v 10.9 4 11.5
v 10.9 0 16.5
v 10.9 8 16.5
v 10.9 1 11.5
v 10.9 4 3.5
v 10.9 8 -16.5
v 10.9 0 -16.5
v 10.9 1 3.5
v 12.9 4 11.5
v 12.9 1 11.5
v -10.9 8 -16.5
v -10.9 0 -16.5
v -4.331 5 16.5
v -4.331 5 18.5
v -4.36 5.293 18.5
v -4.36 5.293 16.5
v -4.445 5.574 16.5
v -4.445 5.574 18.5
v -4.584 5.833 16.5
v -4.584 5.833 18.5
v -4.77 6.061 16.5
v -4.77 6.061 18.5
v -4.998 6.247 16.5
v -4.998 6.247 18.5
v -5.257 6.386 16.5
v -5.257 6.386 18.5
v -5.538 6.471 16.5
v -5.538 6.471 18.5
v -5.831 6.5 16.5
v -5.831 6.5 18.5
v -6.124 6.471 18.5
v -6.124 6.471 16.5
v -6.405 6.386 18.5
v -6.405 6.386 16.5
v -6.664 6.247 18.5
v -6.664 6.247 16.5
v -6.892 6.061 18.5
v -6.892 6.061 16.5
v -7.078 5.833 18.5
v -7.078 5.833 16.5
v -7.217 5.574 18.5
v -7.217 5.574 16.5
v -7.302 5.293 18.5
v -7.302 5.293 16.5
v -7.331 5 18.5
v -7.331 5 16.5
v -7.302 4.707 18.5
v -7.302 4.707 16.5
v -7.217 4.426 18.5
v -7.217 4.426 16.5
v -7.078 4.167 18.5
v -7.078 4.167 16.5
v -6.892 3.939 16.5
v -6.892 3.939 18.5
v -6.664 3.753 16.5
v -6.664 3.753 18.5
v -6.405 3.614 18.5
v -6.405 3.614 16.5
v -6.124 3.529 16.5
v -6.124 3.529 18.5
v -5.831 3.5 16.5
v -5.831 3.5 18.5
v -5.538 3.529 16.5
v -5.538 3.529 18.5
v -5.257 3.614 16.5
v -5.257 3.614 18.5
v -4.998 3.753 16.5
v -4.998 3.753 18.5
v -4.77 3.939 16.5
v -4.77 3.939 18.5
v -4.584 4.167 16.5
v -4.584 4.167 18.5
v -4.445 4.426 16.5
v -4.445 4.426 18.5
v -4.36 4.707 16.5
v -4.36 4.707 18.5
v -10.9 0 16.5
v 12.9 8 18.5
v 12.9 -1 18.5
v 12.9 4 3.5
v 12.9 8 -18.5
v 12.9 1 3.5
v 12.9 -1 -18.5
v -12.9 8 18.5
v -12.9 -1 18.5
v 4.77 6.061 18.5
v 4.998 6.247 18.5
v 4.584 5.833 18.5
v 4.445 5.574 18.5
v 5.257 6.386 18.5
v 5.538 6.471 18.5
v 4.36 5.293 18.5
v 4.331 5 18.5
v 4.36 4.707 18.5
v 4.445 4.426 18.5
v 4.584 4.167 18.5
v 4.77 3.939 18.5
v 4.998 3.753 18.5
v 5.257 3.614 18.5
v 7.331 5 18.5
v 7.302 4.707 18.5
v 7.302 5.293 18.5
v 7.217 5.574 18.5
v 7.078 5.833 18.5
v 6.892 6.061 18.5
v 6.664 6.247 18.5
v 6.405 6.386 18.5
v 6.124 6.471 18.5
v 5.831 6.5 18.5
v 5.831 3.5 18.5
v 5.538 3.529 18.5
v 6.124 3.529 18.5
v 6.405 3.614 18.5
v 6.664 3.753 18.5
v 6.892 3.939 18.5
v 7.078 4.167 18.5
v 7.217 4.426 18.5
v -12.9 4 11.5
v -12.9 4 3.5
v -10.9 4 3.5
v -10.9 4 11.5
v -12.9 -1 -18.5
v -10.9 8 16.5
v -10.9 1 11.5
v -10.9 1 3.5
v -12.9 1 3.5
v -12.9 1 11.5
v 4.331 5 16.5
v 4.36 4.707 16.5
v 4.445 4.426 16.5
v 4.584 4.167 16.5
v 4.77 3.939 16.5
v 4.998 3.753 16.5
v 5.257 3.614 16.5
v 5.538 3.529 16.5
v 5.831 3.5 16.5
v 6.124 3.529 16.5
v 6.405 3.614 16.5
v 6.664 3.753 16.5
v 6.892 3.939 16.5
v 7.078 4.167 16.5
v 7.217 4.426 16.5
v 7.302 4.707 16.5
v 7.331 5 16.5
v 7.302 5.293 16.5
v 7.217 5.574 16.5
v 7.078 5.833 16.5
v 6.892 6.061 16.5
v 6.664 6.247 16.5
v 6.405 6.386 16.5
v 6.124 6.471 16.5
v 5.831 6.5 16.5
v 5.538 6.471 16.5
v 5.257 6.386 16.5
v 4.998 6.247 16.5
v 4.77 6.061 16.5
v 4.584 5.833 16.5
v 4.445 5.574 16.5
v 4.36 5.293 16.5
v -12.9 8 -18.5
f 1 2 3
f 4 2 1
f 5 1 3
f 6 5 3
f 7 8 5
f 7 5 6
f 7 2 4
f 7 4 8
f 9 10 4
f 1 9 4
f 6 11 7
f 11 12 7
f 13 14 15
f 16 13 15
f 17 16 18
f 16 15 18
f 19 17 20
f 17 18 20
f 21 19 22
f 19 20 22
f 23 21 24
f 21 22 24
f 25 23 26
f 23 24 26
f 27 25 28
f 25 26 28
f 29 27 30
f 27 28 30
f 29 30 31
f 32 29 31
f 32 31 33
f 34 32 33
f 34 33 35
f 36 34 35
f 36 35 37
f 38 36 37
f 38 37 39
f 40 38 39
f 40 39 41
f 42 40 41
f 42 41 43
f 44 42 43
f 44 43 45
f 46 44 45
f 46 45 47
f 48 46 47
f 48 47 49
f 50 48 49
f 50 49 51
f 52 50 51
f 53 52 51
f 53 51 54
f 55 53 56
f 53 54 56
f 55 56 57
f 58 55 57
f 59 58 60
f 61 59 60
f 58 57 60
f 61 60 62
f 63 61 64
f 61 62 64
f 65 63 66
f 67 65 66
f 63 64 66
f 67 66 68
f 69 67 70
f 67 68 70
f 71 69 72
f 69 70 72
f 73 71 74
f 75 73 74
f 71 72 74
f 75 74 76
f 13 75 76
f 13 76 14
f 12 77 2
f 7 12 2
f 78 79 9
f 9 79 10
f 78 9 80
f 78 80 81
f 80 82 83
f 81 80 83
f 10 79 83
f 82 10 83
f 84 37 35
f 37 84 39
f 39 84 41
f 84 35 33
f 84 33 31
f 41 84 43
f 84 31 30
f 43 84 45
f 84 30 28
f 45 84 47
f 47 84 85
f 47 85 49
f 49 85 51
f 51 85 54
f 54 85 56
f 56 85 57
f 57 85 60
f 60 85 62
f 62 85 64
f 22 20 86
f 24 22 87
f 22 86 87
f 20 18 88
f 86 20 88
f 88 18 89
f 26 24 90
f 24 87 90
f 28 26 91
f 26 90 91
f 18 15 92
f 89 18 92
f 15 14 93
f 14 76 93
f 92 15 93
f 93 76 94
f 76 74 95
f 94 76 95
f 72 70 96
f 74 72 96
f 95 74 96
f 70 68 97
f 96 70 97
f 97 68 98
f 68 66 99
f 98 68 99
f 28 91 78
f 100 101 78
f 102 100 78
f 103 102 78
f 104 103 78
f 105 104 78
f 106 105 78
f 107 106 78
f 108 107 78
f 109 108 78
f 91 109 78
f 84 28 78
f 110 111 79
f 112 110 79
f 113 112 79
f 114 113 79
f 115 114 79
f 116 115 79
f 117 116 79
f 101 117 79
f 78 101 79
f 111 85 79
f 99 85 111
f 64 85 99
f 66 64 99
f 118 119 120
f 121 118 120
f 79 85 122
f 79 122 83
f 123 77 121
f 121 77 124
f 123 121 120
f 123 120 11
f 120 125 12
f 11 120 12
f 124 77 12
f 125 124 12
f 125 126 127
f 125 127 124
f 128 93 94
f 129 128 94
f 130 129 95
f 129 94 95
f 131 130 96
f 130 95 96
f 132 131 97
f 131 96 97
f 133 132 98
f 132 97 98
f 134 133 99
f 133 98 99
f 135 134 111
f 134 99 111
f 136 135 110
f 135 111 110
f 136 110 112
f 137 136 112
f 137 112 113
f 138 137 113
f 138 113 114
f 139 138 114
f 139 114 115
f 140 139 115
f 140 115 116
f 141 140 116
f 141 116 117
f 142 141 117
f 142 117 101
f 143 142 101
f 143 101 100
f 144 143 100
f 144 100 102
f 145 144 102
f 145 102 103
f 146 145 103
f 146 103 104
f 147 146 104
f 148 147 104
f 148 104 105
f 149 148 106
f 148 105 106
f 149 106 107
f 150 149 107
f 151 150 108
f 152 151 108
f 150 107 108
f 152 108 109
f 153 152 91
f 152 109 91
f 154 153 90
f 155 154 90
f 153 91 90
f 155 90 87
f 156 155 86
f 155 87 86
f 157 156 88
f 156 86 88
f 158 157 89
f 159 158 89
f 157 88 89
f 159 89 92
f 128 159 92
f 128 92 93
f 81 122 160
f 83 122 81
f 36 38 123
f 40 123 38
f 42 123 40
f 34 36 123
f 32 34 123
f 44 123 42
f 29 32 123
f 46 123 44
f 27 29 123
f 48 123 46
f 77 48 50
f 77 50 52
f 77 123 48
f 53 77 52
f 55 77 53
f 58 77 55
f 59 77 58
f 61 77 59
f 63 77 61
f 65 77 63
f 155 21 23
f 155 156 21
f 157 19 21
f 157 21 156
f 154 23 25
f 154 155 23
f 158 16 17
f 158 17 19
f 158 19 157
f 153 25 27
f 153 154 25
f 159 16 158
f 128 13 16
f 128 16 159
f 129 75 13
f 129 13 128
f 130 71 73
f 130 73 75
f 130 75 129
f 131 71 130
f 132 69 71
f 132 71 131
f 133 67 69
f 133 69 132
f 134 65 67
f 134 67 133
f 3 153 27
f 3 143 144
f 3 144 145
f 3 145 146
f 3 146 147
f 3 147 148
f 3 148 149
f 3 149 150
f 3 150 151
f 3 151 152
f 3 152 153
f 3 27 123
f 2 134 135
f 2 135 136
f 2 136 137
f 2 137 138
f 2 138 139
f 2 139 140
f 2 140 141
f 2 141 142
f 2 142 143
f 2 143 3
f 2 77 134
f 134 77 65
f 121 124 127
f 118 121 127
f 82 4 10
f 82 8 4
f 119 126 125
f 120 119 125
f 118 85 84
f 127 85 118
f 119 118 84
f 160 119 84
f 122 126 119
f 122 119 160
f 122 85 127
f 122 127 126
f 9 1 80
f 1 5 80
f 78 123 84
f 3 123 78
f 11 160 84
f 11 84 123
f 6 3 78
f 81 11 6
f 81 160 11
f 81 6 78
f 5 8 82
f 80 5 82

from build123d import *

# Parameters (mm, degrees)
SKETCH1_W           = 25.8
SKETCH1_H           = 37
SKETCH1_W_2         = 21.8
SKETCH1_H_2         = 33
BOSS_EXTRUDE2_DEPTH = 1
BOSS_EXTRUDE3_DEPTH = 3
SKETCH4_W           = 25.8
SKETCH4_H           = 37
BOSS_EXTRUDE4_DEPTH = 1
SKETCH5_W           = 25.8
SKETCH5_H           = 37
SKETCH5_W_2         = 21.8
SKETCH5_H_2         = 33
BOSS_EXTRUDE5_DEPTH = 4
SKETCH6_R           = 1.5
CUT_EXTRUDE1_DEPTH  = 4


with BuildPart() as part:
    # Sketch1 → Boss-Extrude2 (new body)
    with BuildSketch(Plane(origin=(0, 0, 0), x_dir=(1, 0, 0), z_dir=(0, 1, 0))):
        Rectangle(SKETCH1_W, SKETCH1_H)
        Rectangle(SKETCH1_W_2, SKETCH1_H_2, mode=Mode.SUBTRACT)
    extrude(amount=BOSS_EXTRUDE2_DEPTH)

    # Sketch3 → Boss-Extrude3 (add)
    with BuildSketch(Plane(origin=(0, 1, 0), x_dir=(1, 0, 0), z_dir=(0, 1, 0))):
        Polygon((-12.9, -11.5), (-12.9, -18.5), (12.9, -18.5), (12.9, -11.5), (10.9, -11.5), (10.9, -16.5), (-10.9, -16.5), (-10.9, -11.5), align=None)
        Polygon((-12.9, 18.5), (-12.9, -3.5), (-10.9, -3.5), (-10.9, 16.5), (10.9, 16.5), (10.9, -3.5), (12.9, -3.5), (12.9, 18.5), align=None)
    extrude(amount=BOSS_EXTRUDE3_DEPTH)

    # Sketch4 → Boss-Extrude4 (add)
    with BuildSketch(Plane.XZ):
        Rectangle(SKETCH4_W, SKETCH4_H)
    extrude(amount=BOSS_EXTRUDE4_DEPTH)

    # Sketch5 → Boss-Extrude5 (add)
    with BuildSketch(Plane(origin=(0, 4, 0), x_dir=(1, 0, 0), z_dir=(0, 1, 0))):
        Rectangle(SKETCH5_W, SKETCH5_H)
        Rectangle(SKETCH5_W_2, SKETCH5_H_2, mode=Mode.SUBTRACT)
    extrude(amount=BOSS_EXTRUDE5_DEPTH)

    # Sketch6 → Cut-Extrude1 (cut)
    with BuildSketch(Plane.XY.offset(18.5)):
        with Locations((-5.830929934, 5)):
            Circle(SKETCH6_R)
        with Locations(Location((5.830929934, 5, 0), (0, 0, 180))):
            Circle(SKETCH6_R)
    extrude(amount=-CUT_EXTRUDE1_DEPTH, mode=Mode.SUBTRACT)


solid = part.part
